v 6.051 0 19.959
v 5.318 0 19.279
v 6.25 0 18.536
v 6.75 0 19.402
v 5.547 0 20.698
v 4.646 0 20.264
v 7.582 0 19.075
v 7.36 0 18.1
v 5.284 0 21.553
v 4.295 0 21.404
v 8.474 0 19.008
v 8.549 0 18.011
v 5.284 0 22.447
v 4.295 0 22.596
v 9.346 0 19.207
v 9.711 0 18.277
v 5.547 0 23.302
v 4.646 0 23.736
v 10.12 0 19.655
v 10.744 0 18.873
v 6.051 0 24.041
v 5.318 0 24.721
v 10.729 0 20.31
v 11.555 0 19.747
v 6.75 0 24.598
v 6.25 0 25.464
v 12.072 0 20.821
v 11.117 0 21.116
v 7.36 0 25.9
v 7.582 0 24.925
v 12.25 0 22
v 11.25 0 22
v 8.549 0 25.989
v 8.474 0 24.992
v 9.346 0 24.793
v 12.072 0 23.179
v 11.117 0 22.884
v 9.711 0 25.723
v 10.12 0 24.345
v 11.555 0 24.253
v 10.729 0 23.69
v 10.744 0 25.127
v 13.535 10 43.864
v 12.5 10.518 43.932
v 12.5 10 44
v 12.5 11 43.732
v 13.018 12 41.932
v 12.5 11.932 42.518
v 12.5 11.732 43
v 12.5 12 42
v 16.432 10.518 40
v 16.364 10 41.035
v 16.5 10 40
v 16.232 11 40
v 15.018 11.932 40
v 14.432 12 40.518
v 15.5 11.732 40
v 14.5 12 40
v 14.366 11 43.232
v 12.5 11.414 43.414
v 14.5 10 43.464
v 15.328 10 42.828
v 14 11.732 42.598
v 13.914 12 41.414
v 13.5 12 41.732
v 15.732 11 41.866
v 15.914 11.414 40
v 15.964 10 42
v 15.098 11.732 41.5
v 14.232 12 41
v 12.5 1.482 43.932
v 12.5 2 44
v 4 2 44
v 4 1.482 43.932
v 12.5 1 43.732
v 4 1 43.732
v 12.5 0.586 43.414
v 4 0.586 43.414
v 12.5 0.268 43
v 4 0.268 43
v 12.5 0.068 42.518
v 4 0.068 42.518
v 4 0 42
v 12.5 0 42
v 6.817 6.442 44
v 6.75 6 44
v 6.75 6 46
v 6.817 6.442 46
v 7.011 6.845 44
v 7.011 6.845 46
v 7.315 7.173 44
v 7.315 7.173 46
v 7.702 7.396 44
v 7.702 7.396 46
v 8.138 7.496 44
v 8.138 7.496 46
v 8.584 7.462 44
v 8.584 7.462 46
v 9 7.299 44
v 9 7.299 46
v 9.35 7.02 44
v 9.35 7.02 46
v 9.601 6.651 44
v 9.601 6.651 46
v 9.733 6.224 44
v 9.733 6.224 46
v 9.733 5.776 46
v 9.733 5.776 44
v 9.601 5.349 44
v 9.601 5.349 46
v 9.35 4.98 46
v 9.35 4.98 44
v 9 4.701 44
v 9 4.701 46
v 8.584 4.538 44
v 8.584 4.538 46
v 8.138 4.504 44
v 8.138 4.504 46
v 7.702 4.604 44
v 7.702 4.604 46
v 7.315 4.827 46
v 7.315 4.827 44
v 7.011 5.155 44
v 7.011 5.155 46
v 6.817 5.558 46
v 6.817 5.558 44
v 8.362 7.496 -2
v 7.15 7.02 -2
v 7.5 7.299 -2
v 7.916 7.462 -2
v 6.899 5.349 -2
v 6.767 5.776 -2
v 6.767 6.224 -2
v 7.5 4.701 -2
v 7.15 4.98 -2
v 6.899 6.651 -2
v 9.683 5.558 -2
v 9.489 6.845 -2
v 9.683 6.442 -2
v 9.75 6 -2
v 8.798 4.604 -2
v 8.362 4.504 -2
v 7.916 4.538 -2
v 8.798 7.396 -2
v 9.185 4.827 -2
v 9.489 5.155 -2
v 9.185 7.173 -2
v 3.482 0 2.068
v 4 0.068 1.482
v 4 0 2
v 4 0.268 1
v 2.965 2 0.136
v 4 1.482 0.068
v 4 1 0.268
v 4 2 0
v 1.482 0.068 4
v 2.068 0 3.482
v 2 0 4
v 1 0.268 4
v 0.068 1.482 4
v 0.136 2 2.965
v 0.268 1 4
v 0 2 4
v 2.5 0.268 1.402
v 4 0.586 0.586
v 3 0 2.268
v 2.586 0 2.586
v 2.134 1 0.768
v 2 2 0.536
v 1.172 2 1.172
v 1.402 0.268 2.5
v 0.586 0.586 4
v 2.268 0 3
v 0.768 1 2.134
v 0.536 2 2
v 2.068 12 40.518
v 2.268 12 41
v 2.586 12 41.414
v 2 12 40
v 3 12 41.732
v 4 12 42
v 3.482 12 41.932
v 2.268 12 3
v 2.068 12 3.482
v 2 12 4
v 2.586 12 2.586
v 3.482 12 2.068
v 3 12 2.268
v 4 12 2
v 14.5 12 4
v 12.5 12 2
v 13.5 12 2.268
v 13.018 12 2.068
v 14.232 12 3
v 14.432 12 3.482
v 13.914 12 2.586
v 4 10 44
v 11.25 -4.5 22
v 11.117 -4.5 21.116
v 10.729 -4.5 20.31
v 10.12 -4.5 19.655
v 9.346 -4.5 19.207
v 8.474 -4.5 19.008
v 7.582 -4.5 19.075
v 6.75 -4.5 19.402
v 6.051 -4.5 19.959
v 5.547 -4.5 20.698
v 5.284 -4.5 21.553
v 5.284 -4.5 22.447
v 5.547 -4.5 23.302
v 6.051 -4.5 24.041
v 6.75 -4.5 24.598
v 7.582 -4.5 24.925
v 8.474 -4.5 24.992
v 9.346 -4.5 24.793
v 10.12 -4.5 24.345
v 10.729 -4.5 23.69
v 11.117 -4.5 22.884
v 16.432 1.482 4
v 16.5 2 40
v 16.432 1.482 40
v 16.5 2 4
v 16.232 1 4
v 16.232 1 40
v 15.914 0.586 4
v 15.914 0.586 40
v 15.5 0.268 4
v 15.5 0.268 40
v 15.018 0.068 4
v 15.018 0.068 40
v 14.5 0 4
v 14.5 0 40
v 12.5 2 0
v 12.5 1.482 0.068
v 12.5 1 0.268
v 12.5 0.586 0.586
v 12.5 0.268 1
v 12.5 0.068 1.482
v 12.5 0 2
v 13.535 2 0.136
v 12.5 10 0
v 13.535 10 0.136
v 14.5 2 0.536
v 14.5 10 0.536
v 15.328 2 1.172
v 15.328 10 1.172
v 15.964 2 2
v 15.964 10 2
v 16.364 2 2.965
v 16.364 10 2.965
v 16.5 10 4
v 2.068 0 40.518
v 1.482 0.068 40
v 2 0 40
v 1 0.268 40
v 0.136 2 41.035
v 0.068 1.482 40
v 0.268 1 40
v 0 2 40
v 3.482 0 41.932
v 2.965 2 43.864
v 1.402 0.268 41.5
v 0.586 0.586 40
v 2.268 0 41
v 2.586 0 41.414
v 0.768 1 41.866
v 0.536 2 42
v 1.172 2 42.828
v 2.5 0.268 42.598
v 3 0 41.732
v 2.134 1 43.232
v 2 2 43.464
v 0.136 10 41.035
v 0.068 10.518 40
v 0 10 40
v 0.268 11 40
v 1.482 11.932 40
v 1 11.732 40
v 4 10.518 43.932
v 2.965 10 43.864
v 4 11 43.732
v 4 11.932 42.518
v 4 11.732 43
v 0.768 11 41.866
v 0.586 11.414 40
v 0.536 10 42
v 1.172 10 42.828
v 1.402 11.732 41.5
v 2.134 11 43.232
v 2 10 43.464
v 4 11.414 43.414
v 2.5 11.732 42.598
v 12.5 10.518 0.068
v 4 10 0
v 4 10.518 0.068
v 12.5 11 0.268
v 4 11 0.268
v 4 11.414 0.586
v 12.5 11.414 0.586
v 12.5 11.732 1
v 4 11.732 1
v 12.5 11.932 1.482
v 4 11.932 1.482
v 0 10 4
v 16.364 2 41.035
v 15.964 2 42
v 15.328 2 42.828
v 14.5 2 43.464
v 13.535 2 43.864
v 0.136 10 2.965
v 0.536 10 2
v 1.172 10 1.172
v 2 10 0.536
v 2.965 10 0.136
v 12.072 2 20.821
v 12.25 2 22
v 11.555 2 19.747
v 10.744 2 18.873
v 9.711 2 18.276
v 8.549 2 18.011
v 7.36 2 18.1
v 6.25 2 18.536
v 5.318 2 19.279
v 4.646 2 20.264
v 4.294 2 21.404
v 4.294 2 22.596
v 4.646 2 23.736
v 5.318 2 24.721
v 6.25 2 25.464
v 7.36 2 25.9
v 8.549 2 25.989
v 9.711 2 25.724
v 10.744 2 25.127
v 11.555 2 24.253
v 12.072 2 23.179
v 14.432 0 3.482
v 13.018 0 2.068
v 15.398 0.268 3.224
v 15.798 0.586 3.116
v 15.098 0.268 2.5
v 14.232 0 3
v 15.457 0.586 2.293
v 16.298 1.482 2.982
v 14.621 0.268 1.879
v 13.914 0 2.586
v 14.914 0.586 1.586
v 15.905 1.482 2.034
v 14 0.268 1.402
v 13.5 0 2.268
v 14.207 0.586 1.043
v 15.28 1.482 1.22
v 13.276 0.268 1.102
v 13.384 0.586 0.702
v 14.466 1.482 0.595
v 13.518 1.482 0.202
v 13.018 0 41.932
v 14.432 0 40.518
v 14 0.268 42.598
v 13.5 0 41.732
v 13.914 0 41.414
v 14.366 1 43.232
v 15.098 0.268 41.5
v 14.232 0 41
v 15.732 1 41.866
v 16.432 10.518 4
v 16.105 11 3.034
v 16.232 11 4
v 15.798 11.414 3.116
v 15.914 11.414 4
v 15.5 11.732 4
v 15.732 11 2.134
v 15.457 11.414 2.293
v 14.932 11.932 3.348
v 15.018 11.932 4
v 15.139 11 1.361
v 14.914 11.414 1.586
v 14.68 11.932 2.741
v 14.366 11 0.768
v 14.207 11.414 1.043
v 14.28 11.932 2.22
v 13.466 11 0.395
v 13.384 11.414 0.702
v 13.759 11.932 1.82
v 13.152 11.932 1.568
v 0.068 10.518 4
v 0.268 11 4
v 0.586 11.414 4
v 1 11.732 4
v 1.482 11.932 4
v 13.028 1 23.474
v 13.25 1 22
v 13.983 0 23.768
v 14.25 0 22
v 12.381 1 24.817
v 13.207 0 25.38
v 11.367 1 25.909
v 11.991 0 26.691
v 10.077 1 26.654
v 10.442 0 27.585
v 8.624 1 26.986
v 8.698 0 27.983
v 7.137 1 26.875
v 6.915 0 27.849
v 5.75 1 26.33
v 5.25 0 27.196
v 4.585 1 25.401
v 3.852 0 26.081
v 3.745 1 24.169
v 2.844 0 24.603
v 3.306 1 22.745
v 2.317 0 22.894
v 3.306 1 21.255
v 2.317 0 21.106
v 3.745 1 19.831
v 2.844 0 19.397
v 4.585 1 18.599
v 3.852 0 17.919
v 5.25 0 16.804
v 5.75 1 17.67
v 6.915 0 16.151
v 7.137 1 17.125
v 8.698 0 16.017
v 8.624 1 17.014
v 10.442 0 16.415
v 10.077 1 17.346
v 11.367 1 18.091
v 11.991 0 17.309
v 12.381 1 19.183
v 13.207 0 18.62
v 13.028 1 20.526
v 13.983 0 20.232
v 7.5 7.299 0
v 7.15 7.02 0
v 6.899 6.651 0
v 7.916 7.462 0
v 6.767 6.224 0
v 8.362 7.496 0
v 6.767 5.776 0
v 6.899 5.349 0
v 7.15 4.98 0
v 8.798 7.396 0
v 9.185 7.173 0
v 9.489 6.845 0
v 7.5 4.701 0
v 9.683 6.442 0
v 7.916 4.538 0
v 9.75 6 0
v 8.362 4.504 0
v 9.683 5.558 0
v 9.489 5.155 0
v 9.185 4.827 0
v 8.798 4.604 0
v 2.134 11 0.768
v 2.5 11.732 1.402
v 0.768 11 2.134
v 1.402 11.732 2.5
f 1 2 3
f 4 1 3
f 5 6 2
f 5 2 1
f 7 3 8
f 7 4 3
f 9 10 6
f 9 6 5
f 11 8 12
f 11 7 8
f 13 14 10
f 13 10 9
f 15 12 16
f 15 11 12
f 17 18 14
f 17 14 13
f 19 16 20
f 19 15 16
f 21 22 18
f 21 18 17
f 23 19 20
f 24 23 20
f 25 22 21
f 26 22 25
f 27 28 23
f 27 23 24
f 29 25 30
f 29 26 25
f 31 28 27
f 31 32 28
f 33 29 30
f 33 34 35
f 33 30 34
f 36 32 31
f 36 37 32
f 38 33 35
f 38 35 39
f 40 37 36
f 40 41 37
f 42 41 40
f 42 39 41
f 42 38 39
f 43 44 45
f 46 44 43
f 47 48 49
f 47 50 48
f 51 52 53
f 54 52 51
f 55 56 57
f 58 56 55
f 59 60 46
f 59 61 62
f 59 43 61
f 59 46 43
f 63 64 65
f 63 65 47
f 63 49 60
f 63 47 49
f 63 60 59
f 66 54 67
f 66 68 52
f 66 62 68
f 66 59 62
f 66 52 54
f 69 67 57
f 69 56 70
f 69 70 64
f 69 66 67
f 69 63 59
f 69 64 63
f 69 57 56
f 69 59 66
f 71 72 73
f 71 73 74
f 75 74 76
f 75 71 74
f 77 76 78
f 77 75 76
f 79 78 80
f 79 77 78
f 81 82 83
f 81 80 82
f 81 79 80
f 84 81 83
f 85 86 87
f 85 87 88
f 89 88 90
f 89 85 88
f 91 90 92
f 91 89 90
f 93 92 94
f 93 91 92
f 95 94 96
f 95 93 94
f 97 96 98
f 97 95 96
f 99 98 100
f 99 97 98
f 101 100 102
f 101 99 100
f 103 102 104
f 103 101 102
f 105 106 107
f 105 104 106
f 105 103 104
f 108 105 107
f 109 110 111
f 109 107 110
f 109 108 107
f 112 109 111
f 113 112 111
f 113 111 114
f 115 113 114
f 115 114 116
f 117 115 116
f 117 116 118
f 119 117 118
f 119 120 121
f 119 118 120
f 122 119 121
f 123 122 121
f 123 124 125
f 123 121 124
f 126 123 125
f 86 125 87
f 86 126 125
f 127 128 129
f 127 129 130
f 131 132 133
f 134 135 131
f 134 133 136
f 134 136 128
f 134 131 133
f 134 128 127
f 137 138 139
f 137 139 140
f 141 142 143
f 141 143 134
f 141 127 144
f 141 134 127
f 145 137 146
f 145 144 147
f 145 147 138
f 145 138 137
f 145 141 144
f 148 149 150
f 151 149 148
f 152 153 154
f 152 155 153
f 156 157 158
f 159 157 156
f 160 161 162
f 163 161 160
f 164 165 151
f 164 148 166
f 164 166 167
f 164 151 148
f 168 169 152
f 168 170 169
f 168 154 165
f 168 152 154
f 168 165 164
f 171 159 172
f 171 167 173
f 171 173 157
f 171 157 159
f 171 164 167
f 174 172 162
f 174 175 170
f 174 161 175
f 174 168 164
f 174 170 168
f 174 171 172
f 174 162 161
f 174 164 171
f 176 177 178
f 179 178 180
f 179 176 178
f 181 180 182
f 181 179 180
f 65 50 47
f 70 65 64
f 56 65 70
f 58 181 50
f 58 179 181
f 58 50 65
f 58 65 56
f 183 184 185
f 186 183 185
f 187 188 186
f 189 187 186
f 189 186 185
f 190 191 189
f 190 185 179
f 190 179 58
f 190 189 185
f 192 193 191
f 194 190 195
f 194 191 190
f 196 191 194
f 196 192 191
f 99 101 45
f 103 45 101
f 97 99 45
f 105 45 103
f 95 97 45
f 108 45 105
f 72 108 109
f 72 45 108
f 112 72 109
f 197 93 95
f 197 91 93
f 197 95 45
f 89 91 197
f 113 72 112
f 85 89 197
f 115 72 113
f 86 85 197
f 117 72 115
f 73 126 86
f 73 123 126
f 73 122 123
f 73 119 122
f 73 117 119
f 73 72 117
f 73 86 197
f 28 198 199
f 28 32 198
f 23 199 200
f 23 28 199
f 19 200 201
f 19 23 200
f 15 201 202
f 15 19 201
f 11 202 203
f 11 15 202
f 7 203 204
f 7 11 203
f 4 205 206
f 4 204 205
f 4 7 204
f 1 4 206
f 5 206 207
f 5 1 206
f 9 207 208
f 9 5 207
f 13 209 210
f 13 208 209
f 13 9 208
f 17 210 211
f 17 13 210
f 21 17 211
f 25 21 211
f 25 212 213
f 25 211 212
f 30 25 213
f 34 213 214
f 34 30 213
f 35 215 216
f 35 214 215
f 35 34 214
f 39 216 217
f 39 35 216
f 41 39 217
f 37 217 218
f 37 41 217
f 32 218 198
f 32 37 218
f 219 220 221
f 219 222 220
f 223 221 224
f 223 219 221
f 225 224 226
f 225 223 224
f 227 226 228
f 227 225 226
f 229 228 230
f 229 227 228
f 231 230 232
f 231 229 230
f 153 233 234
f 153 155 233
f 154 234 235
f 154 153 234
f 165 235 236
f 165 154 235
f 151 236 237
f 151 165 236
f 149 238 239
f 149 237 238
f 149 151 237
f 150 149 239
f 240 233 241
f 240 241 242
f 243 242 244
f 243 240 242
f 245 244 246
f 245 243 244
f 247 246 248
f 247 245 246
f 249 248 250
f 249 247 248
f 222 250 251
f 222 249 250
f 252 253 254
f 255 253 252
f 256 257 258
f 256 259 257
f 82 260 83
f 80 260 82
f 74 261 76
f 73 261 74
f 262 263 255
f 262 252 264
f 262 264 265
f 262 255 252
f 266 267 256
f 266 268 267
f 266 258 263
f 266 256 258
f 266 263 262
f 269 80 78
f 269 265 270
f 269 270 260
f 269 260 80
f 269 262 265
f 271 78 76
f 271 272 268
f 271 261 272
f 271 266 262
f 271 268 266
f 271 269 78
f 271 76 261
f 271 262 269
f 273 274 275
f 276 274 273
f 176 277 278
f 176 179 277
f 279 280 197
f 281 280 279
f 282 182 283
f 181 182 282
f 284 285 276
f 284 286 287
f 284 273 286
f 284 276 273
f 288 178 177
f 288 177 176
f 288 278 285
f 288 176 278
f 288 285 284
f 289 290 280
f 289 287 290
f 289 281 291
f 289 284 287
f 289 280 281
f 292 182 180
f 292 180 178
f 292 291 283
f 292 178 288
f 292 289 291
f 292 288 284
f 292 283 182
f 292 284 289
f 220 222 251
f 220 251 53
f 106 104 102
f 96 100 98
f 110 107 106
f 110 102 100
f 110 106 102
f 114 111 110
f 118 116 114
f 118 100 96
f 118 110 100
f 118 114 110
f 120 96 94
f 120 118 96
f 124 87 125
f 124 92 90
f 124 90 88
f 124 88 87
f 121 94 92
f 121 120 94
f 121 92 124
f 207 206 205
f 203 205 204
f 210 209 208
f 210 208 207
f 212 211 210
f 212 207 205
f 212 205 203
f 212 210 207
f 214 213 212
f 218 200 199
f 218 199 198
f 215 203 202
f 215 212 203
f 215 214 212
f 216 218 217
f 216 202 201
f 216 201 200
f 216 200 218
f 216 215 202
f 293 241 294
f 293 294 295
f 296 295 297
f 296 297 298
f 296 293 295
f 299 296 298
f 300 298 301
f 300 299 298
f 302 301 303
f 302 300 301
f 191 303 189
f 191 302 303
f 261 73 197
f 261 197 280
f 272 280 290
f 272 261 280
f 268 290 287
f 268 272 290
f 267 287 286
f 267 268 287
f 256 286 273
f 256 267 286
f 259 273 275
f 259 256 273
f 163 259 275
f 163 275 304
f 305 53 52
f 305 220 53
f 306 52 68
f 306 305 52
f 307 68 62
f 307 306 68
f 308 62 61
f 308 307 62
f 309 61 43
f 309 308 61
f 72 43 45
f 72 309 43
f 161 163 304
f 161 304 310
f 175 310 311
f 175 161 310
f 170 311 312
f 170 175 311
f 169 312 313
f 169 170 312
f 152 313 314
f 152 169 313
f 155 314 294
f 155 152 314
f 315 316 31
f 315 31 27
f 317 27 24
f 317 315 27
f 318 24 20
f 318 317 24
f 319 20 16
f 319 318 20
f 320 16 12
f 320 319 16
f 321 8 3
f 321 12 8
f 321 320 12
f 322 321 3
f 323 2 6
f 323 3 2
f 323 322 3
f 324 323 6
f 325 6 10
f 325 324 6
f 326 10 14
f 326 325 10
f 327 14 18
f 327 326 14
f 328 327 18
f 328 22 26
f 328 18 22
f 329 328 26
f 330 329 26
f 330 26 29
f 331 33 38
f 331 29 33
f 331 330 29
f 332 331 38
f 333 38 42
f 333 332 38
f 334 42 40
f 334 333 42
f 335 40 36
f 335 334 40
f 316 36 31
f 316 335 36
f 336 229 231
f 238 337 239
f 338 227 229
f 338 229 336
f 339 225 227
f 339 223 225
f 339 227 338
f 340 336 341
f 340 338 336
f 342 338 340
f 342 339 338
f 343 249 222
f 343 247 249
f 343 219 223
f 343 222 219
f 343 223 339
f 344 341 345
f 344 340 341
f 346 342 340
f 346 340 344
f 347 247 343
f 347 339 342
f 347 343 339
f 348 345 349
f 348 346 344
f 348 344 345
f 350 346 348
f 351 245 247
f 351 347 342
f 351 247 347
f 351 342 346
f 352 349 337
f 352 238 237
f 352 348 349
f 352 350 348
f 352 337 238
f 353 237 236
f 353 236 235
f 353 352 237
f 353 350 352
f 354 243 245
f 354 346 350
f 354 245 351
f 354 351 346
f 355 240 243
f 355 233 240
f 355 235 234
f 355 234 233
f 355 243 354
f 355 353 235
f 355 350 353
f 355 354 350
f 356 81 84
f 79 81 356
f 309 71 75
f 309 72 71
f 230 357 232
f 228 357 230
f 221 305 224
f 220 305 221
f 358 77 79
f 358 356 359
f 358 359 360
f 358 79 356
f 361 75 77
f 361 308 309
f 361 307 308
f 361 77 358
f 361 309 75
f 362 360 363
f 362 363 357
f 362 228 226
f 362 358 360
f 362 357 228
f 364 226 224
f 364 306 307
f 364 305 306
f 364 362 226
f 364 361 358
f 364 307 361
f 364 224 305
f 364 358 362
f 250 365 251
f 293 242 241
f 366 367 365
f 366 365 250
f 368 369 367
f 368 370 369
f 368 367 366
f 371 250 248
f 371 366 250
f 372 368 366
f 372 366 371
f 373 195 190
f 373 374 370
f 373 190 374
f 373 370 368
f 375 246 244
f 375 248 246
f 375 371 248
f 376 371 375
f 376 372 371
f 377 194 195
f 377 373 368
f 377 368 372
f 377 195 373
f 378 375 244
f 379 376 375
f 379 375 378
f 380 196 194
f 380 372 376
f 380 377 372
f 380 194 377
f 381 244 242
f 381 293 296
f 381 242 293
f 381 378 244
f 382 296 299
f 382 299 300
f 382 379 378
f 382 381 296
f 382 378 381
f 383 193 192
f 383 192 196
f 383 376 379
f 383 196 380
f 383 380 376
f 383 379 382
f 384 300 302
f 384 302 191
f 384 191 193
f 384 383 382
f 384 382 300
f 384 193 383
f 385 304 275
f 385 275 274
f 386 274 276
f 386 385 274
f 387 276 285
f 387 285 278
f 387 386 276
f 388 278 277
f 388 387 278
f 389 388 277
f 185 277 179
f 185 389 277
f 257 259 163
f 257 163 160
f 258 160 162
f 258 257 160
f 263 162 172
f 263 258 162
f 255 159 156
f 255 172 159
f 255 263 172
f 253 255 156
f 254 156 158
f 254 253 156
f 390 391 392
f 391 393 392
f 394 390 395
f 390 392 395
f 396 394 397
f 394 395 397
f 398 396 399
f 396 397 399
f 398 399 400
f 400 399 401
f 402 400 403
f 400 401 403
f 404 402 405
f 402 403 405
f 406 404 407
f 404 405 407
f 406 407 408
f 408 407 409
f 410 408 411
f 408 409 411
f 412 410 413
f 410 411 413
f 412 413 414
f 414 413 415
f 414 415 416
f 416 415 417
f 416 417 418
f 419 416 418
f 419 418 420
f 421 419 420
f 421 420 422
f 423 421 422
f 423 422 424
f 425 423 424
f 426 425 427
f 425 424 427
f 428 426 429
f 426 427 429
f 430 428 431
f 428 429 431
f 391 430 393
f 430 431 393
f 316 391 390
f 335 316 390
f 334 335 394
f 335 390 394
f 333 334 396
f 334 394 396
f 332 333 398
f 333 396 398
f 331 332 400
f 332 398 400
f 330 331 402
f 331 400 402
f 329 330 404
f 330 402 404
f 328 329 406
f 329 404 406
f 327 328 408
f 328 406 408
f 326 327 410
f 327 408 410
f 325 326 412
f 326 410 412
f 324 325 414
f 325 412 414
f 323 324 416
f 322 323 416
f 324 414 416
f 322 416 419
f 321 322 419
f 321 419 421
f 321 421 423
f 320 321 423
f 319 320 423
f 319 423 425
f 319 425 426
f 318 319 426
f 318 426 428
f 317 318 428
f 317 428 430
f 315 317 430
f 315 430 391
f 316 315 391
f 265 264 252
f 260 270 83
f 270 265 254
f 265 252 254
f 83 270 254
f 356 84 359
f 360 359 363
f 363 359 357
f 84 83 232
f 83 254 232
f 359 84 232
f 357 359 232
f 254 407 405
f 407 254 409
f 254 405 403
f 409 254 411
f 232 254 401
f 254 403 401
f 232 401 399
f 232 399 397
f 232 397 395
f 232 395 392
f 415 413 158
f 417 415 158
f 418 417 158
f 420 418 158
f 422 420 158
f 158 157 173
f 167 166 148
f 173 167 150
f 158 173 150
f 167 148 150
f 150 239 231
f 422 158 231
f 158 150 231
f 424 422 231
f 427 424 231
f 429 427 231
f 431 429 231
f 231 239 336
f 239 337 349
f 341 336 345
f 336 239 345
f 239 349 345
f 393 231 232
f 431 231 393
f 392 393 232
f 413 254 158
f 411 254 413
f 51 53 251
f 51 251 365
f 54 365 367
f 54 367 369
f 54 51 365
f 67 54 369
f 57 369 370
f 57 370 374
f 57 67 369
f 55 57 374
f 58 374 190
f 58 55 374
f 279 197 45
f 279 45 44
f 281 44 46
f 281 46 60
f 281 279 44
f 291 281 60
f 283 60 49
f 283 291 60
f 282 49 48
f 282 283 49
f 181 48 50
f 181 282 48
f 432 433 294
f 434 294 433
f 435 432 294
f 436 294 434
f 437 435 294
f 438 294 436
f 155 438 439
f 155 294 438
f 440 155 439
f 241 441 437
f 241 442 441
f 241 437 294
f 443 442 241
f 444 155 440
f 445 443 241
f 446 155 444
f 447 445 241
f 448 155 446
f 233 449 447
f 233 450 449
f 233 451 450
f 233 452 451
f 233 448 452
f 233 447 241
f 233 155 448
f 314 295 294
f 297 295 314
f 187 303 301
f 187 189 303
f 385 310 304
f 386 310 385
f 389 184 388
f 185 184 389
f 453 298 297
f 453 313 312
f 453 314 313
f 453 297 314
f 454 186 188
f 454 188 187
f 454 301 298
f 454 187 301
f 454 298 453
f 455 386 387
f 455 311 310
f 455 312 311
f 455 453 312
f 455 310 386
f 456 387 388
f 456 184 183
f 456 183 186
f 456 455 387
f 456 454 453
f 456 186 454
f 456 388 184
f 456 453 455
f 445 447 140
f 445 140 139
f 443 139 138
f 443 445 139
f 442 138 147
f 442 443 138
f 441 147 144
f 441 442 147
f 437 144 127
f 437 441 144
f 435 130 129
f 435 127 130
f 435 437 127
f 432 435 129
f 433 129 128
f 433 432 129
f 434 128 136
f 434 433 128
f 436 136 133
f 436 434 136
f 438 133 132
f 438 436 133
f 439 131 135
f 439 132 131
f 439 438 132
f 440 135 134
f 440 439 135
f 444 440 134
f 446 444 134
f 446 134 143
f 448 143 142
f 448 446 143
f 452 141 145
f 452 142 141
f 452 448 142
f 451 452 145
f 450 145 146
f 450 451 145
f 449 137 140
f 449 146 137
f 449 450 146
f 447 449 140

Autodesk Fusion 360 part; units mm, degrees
sketch "草图1" plane through (0, 0, 0) normal (0, 1, 0) x (1, 0, 0)
  line L0 (4, 0) -> (12.5, 0)
  line L1 (16.5, -4) -> (16.5, -40)
  line L2 (12.5, -44) -> (4, -44)
  line L3 (0, -40) -> (0, -4)
  arc A0 (0, -40) -> (4, -44) centre (4, -40) ccw
  arc A1 (12.5, -44) -> (16.5, -40) centre (12.5, -40) ccw
  arc A2 (16.5, -4) -> (12.5, 0) centre (12.5, -4) ccw
  arc A3 (4, 0) -> (0, -4) centre (4, -4) ccw
  point P0 (16.5, 0)
  point P1 (0, -44)
  dimension "d3" = 4
  dimension "d4" = 4
  dimension "d5" = 4
  dimension "d6" = 4
  dimension "d8" = 44
  dimension "d9" = 16.5
extrude "拉伸1" add sketch "草图1" along normal blind 12 makes body 1
fillet "圆角1" radius 2 8 edges at (16.5, 12, 22) (15.3284, 12, 1.1716) (8.25, 12, 0) (1.1716, 12, 1.1716) (0, 12, 22) (1.1716, 12, 42.8284) (8.25, 12, 44) (15.3284, 12, 42.8284) on bodies 1
fillet "圆角2" radius 2 8 edges at (1.1716, 0, 42.8284) (0, 0, 22) (1.1716, 0, 1.1716) (8.25, 0, 0) (15.3284, 0, 1.1716) (16.5, 0, 22) (15.3284, 0, 42.8284) (8.25, 0, 44) on bodies 1
sketch "草图2" plane through (0, 0, 0) normal (0, -1, 0) x (1, 0, 0)
  arc A0 (4, 42) -> (2, 40) centre (4, 40) ccw
  line L0 (2, 40) -> (2, 4)
  arc A1 (2, 4) -> (4, 2) centre (4, 4) ccw
  line L1 (4, 2) -> (12.5, 2)
  arc A2 (12.5, 2) -> (14.5, 4) centre (12.5, 4) ccw
  line L2 (14.5, 4) -> (14.5, 40)
  arc A3 (14.5, 40) -> (12.5, 42) centre (12.5, 40) ccw
  line L3 (12.5, 42) -> (4, 42)
  circle A4 centre (8.25, 22) radius 5
  dimension "d16" = 10
  dimension "d17" = 6.25
  dimension "d18" = 20
extrude "拉伸2" cut sketch "草图2" against normal blind 2 contours A4 bodies 1
chamfer "倒角1" distance 1 angle 45 1 faces at (13.2438, 1.3333, 21.7508) on bodies 1
sketch "草图3" plane through (0, 2, 0) normal (0, -1, 0) x (1, 0, 0)
  circle A0 centre (8.25, 22) radius 4
  circle A1 centre (8.25, 22) radius 4
  circle A2 centre (8.25, 22) radius 3
  dimension "d22" = 6
extrude "拉伸3" add sketch "草图3" along normal blind 2 bodies 1
extrude "拉伸4" add 1 faces at (7.75, 2, 22.9957) along direction (0, -1, 0) blind 6.5 on bodies 1 bodies 1
sketch "草图4" plane through (0, 0, 0) normal (0, 0, -1) x (1, 0, 0)
  line L0 (12.5, -2) -> (4, -2)
  line L1 (4, -2) -> (4, -10)
  line L2 (4, -10) -> (12.5, -10)
  line L3 (12.5, -10) -> (12.5, -2)
  circle A0 centre (8.25, -6) radius 1.5
  dimension "d27" = 3
  dimension "d29" = 4.25
  dimension "d30" = 4
extrude "拉伸5" add sketch "草图4" along normal blind 2 contours A0 bodies 1
sketch "草图5" plane through (0, 0, 44) normal (0, 0, 1) x (-1, 0, 0)
  line L0 (-4, -2) -> (-12.5, -2)
  line L1 (-12.5, -2) -> (-12.5, -10)
  line L2 (-12.5, -10) -> (-4, -10)
  line L3 (-4, -10) -> (-4, -2)
  circle A0 centre (-8.25, -6) radius 1.5
  dimension "d33" = 3
  dimension "d34" = 4
  dimension "d35" = 4.25
extrude "拉伸6" add sketch "草图5" along normal blind 2 contours A0 bodies 1
copy_body "实体->零部件1" bodies 1 removing the originals makes body 2 in component "Component'"
component "Component'" placed x (1, 0, 0) y (0, 1, 0) z (0, 0, 1) at (0, 0, 0)
